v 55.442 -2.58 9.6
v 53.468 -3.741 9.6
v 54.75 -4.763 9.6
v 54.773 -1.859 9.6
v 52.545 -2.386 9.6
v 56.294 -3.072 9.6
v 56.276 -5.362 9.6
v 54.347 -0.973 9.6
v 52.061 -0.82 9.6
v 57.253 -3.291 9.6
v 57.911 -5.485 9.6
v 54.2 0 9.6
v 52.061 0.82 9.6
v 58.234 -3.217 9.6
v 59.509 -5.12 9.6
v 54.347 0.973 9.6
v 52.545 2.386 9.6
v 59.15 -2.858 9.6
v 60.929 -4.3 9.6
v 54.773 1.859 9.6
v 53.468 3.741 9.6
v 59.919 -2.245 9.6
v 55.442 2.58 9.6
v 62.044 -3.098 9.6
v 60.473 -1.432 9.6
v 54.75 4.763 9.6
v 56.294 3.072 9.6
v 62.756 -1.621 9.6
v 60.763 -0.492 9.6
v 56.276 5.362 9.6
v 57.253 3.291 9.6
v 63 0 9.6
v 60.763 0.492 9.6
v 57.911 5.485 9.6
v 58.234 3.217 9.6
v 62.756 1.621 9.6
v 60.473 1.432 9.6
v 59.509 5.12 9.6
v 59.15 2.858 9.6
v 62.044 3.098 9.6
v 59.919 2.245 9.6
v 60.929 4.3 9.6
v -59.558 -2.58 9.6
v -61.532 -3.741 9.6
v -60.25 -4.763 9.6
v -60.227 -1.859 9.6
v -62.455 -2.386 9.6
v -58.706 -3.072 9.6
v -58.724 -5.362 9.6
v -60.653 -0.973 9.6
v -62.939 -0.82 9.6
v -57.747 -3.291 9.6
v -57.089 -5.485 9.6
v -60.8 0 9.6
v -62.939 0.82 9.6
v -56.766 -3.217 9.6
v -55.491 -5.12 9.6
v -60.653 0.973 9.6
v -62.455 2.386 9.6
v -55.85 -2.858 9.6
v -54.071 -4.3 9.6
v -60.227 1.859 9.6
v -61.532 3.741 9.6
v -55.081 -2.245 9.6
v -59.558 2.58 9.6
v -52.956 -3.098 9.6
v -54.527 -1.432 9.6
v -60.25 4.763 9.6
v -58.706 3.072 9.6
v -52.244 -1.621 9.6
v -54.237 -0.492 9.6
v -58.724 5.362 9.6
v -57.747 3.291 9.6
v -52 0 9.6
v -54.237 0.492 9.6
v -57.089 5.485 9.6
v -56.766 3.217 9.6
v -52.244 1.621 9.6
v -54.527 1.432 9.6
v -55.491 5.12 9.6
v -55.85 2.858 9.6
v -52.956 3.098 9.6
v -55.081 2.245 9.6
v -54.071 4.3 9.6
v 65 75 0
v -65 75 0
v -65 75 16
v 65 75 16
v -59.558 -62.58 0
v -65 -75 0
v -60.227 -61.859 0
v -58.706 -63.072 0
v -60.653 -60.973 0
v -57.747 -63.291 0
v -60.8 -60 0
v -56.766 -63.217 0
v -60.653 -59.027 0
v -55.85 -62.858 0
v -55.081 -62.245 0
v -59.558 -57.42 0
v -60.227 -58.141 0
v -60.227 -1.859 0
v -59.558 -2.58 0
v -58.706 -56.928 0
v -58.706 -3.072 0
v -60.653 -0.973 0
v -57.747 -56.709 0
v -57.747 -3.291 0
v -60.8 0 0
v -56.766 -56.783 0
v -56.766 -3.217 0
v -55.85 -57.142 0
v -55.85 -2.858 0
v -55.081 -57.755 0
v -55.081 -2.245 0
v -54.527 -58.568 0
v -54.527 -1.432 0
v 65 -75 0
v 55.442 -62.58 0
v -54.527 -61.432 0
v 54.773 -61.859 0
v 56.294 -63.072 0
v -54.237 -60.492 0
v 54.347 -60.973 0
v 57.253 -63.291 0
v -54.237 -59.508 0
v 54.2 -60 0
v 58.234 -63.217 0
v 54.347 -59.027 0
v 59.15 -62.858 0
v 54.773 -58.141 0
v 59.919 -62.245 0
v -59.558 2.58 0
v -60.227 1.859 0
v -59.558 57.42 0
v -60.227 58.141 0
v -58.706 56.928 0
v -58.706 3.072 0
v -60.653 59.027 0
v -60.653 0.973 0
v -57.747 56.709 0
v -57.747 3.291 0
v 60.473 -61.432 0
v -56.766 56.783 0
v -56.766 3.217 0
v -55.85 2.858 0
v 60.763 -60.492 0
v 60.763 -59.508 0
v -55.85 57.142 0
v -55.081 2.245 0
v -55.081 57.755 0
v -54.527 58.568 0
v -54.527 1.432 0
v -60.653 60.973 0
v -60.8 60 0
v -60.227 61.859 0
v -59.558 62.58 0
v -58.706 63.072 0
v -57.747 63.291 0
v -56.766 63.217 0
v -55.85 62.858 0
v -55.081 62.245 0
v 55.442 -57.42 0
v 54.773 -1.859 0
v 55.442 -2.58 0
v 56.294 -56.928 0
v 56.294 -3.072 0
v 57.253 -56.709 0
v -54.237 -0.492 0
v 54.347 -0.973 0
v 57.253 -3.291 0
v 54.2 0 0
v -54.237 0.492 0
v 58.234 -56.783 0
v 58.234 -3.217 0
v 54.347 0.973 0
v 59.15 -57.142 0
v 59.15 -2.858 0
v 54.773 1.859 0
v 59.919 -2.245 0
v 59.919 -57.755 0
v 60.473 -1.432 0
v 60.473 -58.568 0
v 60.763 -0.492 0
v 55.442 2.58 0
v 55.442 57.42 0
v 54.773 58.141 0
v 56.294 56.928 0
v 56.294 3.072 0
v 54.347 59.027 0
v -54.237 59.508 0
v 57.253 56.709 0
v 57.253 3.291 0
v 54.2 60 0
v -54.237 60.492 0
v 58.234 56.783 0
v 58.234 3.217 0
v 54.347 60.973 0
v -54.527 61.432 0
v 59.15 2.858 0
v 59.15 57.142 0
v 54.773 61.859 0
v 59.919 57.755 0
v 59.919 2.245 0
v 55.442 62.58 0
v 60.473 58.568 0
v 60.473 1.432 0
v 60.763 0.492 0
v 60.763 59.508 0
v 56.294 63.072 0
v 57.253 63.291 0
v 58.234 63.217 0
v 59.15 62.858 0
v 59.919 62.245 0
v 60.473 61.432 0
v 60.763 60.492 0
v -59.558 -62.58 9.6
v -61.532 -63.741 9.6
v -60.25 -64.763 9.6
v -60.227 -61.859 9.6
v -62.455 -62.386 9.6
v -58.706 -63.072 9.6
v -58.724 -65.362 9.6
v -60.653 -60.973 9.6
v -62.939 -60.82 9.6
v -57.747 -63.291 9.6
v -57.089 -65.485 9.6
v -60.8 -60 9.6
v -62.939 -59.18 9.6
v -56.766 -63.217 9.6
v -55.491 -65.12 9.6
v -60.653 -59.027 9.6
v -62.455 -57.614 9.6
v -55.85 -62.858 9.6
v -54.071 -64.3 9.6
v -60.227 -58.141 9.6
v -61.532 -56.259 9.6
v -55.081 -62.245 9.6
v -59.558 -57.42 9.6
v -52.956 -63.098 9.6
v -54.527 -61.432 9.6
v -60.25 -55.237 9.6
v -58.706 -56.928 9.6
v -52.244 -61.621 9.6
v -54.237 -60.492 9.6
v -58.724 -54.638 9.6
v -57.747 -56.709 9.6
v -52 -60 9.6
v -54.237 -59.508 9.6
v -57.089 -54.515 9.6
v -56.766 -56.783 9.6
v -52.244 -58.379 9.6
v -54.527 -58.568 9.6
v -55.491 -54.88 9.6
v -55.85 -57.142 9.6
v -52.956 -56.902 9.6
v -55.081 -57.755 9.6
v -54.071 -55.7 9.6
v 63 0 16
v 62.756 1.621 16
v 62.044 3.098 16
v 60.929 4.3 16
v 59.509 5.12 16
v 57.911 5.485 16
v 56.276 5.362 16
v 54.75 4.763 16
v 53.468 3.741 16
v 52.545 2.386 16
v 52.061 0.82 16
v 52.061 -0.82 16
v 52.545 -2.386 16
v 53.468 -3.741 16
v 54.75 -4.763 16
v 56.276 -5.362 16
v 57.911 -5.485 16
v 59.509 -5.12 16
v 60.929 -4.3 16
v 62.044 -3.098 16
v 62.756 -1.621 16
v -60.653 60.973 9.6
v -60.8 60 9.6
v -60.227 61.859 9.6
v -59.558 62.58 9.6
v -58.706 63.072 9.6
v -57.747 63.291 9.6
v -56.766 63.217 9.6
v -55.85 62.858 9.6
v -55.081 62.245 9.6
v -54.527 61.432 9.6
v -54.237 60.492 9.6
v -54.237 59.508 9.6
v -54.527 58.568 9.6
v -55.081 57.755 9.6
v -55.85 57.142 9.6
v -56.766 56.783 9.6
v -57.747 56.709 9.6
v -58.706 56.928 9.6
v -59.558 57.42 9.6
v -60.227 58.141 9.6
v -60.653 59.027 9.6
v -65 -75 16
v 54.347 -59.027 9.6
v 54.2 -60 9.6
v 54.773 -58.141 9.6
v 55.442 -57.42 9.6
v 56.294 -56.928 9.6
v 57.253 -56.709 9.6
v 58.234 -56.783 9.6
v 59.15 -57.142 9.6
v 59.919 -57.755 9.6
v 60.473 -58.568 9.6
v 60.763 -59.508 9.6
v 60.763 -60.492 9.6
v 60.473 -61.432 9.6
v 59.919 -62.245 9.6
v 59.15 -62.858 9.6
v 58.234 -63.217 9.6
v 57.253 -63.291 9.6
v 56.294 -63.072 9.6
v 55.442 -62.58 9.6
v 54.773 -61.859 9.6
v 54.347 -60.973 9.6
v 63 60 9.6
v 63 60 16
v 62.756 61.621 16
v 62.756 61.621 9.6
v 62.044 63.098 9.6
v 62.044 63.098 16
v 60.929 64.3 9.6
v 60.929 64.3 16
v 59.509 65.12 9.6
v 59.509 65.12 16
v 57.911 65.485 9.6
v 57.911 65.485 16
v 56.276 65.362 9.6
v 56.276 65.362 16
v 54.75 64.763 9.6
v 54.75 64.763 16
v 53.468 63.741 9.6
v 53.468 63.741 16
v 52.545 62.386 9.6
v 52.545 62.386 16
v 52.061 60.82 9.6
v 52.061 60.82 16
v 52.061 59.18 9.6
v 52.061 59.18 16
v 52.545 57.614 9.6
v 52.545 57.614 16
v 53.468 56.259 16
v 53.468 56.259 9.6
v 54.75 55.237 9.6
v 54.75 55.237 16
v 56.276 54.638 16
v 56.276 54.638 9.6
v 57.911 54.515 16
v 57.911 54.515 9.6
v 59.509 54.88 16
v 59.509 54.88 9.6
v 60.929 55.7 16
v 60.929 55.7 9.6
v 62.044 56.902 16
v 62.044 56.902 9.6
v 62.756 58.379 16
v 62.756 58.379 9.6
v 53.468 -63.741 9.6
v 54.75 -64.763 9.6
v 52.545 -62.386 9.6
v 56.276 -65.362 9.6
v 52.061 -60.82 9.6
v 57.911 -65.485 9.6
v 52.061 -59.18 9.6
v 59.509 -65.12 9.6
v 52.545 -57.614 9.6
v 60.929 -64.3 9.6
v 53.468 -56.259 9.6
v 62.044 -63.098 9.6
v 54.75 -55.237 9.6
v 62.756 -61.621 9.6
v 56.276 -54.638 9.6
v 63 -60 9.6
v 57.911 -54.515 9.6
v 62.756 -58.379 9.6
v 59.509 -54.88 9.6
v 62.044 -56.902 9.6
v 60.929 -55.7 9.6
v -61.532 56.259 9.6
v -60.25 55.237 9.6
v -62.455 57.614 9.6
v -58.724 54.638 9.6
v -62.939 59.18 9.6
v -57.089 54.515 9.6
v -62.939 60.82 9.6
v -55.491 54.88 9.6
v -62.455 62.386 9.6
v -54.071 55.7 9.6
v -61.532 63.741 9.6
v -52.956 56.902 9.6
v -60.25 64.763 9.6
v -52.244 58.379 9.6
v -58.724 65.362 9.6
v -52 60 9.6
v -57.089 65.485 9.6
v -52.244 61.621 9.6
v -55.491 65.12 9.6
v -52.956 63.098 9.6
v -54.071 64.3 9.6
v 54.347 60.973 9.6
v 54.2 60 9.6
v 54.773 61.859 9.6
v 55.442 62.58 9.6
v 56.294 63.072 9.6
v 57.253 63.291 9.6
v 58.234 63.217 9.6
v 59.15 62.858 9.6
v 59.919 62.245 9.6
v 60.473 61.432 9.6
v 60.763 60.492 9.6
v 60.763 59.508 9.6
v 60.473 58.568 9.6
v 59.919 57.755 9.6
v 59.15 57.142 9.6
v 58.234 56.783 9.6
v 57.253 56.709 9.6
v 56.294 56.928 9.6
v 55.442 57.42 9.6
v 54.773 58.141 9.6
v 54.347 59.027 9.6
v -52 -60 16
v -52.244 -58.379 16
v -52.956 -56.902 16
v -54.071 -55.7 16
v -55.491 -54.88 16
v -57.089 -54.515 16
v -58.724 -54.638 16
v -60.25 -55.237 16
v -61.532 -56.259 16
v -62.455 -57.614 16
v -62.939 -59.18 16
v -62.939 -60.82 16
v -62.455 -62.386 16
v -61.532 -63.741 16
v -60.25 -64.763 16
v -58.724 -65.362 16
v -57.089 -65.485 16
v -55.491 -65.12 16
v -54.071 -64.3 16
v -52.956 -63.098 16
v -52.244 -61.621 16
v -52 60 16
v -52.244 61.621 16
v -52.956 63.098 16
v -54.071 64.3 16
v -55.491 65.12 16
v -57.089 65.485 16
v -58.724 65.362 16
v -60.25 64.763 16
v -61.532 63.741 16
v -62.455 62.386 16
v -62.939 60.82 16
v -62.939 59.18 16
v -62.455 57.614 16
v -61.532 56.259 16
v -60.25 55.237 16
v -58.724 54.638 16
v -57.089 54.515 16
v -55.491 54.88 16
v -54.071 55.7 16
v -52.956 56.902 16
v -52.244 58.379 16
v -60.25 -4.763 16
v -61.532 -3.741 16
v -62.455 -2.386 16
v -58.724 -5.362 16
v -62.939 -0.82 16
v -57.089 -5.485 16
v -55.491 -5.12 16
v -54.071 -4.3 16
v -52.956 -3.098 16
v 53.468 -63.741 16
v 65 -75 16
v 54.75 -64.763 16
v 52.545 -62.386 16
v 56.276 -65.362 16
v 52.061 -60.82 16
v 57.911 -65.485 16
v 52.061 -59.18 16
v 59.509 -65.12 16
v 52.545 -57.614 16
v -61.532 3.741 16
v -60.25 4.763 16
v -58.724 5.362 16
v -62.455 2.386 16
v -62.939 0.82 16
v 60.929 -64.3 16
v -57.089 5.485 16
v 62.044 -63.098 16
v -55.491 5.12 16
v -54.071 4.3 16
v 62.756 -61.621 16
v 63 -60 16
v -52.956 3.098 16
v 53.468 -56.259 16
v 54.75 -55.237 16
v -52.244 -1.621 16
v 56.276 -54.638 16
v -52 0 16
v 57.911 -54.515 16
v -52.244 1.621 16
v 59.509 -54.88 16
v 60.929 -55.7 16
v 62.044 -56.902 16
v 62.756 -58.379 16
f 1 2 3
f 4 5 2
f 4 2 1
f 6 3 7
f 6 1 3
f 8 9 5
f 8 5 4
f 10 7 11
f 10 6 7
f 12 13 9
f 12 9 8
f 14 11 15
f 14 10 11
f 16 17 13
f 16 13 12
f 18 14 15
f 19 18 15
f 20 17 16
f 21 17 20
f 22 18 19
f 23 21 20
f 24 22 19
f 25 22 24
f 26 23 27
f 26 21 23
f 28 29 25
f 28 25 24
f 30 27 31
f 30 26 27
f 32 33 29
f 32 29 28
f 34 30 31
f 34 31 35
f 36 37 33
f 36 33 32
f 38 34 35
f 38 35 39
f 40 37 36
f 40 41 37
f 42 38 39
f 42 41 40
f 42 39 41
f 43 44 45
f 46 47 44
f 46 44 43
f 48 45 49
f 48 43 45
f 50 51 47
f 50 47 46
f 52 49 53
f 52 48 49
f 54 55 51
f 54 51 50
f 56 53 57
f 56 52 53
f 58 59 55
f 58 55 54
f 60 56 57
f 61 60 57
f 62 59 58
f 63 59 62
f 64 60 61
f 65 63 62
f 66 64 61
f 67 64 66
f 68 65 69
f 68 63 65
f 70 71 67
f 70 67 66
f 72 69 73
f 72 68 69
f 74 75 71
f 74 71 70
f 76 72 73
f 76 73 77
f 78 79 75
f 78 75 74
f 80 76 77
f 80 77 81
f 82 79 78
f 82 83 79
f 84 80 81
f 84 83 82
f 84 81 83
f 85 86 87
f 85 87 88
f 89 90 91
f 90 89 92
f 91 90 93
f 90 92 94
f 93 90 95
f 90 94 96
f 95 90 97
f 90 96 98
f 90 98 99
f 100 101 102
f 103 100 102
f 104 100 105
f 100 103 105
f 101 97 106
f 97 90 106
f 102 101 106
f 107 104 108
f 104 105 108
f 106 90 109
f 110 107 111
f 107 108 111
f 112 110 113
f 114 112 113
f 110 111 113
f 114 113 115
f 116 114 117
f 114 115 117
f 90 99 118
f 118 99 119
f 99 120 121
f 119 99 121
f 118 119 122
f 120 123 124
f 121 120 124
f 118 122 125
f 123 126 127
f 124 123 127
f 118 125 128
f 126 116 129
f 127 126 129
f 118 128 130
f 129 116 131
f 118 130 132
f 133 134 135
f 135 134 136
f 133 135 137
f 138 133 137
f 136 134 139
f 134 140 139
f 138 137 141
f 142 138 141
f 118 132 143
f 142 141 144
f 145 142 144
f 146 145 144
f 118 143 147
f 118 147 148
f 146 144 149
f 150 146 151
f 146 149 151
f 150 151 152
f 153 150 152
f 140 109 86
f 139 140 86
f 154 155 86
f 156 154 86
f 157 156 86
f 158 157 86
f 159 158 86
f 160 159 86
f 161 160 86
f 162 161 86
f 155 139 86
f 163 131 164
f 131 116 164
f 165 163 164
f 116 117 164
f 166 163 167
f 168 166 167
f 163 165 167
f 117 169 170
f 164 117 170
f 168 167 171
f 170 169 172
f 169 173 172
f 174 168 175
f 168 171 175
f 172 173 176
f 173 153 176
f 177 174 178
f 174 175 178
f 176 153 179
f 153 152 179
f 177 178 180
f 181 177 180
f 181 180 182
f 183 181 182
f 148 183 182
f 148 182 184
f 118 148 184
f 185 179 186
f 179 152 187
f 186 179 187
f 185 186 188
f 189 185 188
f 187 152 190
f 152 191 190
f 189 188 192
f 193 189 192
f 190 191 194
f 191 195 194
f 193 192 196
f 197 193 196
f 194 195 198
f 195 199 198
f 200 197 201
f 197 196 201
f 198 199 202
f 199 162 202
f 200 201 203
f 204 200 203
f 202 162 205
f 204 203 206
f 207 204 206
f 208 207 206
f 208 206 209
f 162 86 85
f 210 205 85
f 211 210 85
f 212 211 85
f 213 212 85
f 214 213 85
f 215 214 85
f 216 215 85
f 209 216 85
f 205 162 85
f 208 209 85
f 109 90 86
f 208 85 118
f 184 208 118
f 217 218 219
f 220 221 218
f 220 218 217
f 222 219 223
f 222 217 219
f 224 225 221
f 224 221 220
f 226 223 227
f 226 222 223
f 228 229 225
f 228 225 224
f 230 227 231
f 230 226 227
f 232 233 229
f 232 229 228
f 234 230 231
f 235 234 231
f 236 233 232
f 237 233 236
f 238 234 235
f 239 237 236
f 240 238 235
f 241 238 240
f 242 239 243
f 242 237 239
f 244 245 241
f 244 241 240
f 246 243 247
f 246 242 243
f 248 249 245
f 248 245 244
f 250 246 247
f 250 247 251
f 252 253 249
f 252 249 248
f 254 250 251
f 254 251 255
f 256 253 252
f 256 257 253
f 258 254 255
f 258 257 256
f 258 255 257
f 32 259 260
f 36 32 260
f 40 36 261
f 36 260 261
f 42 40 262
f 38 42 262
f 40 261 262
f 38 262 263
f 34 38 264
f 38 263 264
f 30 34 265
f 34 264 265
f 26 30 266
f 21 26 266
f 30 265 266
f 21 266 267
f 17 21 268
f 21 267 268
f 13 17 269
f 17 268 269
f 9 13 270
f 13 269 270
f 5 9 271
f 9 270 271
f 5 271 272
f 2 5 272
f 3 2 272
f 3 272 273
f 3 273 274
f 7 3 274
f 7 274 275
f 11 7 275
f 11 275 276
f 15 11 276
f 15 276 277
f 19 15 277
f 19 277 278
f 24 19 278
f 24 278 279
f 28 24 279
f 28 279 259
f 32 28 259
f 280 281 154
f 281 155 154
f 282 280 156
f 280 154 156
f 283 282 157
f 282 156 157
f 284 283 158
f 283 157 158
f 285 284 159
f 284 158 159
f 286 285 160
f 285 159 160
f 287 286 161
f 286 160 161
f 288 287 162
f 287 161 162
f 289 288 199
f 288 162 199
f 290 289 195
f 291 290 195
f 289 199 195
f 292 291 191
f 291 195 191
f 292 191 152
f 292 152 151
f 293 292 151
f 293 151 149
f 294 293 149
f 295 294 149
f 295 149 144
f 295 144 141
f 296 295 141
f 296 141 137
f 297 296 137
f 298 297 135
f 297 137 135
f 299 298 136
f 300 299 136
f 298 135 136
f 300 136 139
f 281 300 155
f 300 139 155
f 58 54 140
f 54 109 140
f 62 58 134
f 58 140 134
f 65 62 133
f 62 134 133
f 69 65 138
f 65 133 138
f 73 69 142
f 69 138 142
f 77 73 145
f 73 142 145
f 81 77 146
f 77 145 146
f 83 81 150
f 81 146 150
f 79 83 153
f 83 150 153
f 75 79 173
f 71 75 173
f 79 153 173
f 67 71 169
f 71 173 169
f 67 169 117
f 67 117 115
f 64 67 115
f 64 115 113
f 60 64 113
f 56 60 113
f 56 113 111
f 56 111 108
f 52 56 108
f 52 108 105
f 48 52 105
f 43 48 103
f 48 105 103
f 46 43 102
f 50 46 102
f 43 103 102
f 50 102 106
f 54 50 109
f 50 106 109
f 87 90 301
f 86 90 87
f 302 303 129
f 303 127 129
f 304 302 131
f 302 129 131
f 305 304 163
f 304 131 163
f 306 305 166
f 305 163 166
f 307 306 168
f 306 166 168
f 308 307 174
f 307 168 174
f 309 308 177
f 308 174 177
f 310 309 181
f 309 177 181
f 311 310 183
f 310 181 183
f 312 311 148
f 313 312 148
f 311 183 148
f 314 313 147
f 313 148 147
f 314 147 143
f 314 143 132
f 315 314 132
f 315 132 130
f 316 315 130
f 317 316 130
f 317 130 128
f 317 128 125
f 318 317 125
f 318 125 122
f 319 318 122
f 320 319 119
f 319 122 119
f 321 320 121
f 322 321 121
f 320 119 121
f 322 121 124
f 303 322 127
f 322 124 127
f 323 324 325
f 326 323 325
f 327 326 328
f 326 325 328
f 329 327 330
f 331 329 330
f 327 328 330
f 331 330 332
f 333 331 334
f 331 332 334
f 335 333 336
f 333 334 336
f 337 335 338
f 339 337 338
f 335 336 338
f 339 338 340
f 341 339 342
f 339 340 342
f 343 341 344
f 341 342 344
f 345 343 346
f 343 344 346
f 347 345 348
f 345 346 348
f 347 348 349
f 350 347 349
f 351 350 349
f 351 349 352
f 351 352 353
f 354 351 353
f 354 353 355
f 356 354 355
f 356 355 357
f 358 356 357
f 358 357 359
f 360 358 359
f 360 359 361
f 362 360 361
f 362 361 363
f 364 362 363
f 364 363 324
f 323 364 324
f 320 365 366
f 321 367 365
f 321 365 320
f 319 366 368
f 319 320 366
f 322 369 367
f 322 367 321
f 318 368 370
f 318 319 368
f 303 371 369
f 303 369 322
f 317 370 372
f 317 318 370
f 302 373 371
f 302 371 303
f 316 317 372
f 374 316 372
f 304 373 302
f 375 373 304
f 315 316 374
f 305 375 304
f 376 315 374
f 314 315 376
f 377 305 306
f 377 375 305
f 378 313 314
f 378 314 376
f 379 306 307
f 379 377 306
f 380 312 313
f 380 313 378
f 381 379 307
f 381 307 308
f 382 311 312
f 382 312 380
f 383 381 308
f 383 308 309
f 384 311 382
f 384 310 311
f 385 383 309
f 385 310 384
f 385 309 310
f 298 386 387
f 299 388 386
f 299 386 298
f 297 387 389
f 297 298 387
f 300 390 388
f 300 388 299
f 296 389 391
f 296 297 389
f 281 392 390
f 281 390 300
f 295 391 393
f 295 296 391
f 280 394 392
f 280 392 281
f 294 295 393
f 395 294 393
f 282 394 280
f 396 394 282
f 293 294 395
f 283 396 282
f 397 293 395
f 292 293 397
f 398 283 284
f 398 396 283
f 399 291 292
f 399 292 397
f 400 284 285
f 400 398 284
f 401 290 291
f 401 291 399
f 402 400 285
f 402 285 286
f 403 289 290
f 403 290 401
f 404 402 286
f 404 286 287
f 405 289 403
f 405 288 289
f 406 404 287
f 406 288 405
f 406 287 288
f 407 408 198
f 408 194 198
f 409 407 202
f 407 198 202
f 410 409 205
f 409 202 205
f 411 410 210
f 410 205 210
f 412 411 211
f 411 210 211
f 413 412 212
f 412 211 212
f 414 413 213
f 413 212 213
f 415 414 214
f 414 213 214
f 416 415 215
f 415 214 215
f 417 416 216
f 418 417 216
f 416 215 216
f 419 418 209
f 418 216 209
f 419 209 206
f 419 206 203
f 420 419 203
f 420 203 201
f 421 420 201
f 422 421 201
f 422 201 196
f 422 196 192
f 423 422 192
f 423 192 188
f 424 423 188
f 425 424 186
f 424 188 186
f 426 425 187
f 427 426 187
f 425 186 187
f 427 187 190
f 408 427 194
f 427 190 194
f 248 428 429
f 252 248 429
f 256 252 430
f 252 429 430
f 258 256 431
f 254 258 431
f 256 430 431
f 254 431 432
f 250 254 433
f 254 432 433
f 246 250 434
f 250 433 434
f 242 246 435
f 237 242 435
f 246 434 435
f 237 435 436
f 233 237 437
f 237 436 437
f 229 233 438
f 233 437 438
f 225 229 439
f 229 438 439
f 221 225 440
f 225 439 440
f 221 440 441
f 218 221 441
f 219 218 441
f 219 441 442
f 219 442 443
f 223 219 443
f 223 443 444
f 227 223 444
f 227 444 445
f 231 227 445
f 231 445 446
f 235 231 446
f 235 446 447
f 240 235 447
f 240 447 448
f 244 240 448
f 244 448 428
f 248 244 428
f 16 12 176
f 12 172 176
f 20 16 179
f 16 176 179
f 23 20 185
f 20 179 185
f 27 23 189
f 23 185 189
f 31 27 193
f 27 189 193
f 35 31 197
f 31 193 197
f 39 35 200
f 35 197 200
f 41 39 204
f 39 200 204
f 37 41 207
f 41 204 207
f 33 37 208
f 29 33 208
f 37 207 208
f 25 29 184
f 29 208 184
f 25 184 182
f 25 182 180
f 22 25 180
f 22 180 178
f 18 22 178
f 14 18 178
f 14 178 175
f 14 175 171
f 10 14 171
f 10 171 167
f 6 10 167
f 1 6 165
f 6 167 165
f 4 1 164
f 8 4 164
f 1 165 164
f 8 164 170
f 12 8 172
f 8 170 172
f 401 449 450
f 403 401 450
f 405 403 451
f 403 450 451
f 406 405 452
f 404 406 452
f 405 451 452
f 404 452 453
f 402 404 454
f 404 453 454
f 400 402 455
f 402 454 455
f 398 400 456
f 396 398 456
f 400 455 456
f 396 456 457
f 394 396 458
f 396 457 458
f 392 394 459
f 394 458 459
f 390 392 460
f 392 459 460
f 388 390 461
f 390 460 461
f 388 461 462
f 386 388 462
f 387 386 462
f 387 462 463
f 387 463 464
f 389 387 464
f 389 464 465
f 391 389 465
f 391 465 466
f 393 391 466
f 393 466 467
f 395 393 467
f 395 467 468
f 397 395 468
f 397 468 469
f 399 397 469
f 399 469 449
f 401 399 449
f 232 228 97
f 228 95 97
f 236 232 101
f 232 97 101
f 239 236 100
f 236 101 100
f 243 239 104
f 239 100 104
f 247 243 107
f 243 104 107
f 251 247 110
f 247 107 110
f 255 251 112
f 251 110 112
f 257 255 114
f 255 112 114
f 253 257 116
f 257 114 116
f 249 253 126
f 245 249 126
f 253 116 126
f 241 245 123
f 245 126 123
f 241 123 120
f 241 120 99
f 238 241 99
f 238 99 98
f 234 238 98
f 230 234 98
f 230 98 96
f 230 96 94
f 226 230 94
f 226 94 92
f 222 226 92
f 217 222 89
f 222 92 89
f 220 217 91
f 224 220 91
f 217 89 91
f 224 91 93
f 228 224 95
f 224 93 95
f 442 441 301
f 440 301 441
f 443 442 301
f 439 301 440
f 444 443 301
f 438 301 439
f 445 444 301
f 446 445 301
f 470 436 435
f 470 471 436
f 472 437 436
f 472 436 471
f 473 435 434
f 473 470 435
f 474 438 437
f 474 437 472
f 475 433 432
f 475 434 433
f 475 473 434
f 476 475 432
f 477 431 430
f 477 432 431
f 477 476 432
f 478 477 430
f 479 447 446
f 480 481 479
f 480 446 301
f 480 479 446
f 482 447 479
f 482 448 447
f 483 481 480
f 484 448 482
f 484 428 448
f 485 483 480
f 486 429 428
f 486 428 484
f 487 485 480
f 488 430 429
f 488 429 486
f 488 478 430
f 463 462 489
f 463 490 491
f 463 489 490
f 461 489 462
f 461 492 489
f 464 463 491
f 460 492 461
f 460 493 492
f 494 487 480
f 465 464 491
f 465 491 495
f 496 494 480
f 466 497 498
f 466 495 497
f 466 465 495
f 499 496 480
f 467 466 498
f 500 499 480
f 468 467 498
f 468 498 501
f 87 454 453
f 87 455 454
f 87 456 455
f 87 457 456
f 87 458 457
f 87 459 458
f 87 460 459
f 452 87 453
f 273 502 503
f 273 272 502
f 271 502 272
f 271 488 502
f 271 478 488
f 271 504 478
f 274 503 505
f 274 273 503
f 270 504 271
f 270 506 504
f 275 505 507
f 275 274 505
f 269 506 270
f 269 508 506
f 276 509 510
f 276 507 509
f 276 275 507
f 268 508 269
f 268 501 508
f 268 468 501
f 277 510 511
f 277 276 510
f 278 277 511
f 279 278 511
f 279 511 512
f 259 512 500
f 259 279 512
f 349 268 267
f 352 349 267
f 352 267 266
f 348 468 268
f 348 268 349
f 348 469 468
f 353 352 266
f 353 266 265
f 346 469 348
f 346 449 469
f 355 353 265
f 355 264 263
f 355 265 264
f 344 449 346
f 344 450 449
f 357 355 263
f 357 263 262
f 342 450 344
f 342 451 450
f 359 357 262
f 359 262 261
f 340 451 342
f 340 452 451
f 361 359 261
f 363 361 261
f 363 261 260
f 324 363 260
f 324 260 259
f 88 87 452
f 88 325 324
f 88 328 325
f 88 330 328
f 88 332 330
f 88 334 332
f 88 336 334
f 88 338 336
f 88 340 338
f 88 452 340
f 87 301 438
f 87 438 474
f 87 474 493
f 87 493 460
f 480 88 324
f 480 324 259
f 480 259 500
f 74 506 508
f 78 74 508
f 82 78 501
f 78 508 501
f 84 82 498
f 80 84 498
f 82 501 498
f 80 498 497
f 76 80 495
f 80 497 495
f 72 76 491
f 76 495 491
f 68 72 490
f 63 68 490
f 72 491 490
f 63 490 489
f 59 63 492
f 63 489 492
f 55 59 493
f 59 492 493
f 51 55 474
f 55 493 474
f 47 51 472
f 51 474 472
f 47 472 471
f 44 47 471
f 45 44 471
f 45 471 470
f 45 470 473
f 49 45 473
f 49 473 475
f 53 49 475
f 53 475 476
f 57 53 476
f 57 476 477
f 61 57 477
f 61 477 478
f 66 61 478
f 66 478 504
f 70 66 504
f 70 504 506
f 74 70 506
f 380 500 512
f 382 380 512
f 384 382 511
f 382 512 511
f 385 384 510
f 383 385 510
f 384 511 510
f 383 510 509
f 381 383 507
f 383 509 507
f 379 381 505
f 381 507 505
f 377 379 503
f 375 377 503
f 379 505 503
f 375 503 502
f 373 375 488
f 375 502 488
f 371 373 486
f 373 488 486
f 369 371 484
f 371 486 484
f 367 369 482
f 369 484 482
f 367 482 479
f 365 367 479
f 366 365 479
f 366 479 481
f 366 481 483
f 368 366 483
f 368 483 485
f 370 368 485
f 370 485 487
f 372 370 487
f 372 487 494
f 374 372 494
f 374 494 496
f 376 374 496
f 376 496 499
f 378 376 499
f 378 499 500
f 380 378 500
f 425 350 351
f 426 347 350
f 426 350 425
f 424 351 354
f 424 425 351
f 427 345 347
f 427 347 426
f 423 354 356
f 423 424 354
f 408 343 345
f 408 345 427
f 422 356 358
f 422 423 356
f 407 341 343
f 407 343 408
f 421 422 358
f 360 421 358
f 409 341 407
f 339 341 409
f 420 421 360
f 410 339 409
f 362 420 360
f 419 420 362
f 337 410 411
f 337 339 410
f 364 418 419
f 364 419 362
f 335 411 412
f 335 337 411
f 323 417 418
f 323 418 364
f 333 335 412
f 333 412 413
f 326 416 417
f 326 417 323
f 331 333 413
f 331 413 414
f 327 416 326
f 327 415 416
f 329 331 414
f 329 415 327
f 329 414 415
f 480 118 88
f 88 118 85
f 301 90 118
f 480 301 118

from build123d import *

# Parameters (mm, degrees)
SKETCH1_W                                           = 130
SKETCH1_H                                           = 150
EXTRUDE1_DEPTH                                      = 16
CBORE_FOR_M6_HEX_SOCKET_HEAD_CAP_SCREW1_D           = 6.6
CBORE_FOR_M6_HEX_SOCKET_HEAD_CAP_SCREW1_CBORE_D     = 11
CBORE_FOR_M6_HEX_SOCKET_HEAD_CAP_SCREW1_CBORE_DEPTH = 6.4


with BuildPart() as part:
    # Sketch1 → Extrude1 (new body)
    with BuildSketch(Plane.XY):
        Rectangle(SKETCH1_W, SKETCH1_H)
    extrude(amount=EXTRUDE1_DEPTH)

    # CBORE for M6 Hex Socket Head Cap Screw1 (through all)
    with Locations(Plane.XY.offset(16)):
        with Locations((-57.5, 60), (-57.5, 0), (-57.5, -60), (57.5, -60), (57.5, 0), (57.5, 60)):
            CounterBoreHole(CBORE_FOR_M6_HEX_SOCKET_HEAD_CAP_SCREW1_D / 2, CBORE_FOR_M6_HEX_SOCKET_HEAD_CAP_SCREW1_CBORE_D / 2, CBORE_FOR_M6_HEX_SOCKET_HEAD_CAP_SCREW1_CBORE_DEPTH)


solid = part.part
